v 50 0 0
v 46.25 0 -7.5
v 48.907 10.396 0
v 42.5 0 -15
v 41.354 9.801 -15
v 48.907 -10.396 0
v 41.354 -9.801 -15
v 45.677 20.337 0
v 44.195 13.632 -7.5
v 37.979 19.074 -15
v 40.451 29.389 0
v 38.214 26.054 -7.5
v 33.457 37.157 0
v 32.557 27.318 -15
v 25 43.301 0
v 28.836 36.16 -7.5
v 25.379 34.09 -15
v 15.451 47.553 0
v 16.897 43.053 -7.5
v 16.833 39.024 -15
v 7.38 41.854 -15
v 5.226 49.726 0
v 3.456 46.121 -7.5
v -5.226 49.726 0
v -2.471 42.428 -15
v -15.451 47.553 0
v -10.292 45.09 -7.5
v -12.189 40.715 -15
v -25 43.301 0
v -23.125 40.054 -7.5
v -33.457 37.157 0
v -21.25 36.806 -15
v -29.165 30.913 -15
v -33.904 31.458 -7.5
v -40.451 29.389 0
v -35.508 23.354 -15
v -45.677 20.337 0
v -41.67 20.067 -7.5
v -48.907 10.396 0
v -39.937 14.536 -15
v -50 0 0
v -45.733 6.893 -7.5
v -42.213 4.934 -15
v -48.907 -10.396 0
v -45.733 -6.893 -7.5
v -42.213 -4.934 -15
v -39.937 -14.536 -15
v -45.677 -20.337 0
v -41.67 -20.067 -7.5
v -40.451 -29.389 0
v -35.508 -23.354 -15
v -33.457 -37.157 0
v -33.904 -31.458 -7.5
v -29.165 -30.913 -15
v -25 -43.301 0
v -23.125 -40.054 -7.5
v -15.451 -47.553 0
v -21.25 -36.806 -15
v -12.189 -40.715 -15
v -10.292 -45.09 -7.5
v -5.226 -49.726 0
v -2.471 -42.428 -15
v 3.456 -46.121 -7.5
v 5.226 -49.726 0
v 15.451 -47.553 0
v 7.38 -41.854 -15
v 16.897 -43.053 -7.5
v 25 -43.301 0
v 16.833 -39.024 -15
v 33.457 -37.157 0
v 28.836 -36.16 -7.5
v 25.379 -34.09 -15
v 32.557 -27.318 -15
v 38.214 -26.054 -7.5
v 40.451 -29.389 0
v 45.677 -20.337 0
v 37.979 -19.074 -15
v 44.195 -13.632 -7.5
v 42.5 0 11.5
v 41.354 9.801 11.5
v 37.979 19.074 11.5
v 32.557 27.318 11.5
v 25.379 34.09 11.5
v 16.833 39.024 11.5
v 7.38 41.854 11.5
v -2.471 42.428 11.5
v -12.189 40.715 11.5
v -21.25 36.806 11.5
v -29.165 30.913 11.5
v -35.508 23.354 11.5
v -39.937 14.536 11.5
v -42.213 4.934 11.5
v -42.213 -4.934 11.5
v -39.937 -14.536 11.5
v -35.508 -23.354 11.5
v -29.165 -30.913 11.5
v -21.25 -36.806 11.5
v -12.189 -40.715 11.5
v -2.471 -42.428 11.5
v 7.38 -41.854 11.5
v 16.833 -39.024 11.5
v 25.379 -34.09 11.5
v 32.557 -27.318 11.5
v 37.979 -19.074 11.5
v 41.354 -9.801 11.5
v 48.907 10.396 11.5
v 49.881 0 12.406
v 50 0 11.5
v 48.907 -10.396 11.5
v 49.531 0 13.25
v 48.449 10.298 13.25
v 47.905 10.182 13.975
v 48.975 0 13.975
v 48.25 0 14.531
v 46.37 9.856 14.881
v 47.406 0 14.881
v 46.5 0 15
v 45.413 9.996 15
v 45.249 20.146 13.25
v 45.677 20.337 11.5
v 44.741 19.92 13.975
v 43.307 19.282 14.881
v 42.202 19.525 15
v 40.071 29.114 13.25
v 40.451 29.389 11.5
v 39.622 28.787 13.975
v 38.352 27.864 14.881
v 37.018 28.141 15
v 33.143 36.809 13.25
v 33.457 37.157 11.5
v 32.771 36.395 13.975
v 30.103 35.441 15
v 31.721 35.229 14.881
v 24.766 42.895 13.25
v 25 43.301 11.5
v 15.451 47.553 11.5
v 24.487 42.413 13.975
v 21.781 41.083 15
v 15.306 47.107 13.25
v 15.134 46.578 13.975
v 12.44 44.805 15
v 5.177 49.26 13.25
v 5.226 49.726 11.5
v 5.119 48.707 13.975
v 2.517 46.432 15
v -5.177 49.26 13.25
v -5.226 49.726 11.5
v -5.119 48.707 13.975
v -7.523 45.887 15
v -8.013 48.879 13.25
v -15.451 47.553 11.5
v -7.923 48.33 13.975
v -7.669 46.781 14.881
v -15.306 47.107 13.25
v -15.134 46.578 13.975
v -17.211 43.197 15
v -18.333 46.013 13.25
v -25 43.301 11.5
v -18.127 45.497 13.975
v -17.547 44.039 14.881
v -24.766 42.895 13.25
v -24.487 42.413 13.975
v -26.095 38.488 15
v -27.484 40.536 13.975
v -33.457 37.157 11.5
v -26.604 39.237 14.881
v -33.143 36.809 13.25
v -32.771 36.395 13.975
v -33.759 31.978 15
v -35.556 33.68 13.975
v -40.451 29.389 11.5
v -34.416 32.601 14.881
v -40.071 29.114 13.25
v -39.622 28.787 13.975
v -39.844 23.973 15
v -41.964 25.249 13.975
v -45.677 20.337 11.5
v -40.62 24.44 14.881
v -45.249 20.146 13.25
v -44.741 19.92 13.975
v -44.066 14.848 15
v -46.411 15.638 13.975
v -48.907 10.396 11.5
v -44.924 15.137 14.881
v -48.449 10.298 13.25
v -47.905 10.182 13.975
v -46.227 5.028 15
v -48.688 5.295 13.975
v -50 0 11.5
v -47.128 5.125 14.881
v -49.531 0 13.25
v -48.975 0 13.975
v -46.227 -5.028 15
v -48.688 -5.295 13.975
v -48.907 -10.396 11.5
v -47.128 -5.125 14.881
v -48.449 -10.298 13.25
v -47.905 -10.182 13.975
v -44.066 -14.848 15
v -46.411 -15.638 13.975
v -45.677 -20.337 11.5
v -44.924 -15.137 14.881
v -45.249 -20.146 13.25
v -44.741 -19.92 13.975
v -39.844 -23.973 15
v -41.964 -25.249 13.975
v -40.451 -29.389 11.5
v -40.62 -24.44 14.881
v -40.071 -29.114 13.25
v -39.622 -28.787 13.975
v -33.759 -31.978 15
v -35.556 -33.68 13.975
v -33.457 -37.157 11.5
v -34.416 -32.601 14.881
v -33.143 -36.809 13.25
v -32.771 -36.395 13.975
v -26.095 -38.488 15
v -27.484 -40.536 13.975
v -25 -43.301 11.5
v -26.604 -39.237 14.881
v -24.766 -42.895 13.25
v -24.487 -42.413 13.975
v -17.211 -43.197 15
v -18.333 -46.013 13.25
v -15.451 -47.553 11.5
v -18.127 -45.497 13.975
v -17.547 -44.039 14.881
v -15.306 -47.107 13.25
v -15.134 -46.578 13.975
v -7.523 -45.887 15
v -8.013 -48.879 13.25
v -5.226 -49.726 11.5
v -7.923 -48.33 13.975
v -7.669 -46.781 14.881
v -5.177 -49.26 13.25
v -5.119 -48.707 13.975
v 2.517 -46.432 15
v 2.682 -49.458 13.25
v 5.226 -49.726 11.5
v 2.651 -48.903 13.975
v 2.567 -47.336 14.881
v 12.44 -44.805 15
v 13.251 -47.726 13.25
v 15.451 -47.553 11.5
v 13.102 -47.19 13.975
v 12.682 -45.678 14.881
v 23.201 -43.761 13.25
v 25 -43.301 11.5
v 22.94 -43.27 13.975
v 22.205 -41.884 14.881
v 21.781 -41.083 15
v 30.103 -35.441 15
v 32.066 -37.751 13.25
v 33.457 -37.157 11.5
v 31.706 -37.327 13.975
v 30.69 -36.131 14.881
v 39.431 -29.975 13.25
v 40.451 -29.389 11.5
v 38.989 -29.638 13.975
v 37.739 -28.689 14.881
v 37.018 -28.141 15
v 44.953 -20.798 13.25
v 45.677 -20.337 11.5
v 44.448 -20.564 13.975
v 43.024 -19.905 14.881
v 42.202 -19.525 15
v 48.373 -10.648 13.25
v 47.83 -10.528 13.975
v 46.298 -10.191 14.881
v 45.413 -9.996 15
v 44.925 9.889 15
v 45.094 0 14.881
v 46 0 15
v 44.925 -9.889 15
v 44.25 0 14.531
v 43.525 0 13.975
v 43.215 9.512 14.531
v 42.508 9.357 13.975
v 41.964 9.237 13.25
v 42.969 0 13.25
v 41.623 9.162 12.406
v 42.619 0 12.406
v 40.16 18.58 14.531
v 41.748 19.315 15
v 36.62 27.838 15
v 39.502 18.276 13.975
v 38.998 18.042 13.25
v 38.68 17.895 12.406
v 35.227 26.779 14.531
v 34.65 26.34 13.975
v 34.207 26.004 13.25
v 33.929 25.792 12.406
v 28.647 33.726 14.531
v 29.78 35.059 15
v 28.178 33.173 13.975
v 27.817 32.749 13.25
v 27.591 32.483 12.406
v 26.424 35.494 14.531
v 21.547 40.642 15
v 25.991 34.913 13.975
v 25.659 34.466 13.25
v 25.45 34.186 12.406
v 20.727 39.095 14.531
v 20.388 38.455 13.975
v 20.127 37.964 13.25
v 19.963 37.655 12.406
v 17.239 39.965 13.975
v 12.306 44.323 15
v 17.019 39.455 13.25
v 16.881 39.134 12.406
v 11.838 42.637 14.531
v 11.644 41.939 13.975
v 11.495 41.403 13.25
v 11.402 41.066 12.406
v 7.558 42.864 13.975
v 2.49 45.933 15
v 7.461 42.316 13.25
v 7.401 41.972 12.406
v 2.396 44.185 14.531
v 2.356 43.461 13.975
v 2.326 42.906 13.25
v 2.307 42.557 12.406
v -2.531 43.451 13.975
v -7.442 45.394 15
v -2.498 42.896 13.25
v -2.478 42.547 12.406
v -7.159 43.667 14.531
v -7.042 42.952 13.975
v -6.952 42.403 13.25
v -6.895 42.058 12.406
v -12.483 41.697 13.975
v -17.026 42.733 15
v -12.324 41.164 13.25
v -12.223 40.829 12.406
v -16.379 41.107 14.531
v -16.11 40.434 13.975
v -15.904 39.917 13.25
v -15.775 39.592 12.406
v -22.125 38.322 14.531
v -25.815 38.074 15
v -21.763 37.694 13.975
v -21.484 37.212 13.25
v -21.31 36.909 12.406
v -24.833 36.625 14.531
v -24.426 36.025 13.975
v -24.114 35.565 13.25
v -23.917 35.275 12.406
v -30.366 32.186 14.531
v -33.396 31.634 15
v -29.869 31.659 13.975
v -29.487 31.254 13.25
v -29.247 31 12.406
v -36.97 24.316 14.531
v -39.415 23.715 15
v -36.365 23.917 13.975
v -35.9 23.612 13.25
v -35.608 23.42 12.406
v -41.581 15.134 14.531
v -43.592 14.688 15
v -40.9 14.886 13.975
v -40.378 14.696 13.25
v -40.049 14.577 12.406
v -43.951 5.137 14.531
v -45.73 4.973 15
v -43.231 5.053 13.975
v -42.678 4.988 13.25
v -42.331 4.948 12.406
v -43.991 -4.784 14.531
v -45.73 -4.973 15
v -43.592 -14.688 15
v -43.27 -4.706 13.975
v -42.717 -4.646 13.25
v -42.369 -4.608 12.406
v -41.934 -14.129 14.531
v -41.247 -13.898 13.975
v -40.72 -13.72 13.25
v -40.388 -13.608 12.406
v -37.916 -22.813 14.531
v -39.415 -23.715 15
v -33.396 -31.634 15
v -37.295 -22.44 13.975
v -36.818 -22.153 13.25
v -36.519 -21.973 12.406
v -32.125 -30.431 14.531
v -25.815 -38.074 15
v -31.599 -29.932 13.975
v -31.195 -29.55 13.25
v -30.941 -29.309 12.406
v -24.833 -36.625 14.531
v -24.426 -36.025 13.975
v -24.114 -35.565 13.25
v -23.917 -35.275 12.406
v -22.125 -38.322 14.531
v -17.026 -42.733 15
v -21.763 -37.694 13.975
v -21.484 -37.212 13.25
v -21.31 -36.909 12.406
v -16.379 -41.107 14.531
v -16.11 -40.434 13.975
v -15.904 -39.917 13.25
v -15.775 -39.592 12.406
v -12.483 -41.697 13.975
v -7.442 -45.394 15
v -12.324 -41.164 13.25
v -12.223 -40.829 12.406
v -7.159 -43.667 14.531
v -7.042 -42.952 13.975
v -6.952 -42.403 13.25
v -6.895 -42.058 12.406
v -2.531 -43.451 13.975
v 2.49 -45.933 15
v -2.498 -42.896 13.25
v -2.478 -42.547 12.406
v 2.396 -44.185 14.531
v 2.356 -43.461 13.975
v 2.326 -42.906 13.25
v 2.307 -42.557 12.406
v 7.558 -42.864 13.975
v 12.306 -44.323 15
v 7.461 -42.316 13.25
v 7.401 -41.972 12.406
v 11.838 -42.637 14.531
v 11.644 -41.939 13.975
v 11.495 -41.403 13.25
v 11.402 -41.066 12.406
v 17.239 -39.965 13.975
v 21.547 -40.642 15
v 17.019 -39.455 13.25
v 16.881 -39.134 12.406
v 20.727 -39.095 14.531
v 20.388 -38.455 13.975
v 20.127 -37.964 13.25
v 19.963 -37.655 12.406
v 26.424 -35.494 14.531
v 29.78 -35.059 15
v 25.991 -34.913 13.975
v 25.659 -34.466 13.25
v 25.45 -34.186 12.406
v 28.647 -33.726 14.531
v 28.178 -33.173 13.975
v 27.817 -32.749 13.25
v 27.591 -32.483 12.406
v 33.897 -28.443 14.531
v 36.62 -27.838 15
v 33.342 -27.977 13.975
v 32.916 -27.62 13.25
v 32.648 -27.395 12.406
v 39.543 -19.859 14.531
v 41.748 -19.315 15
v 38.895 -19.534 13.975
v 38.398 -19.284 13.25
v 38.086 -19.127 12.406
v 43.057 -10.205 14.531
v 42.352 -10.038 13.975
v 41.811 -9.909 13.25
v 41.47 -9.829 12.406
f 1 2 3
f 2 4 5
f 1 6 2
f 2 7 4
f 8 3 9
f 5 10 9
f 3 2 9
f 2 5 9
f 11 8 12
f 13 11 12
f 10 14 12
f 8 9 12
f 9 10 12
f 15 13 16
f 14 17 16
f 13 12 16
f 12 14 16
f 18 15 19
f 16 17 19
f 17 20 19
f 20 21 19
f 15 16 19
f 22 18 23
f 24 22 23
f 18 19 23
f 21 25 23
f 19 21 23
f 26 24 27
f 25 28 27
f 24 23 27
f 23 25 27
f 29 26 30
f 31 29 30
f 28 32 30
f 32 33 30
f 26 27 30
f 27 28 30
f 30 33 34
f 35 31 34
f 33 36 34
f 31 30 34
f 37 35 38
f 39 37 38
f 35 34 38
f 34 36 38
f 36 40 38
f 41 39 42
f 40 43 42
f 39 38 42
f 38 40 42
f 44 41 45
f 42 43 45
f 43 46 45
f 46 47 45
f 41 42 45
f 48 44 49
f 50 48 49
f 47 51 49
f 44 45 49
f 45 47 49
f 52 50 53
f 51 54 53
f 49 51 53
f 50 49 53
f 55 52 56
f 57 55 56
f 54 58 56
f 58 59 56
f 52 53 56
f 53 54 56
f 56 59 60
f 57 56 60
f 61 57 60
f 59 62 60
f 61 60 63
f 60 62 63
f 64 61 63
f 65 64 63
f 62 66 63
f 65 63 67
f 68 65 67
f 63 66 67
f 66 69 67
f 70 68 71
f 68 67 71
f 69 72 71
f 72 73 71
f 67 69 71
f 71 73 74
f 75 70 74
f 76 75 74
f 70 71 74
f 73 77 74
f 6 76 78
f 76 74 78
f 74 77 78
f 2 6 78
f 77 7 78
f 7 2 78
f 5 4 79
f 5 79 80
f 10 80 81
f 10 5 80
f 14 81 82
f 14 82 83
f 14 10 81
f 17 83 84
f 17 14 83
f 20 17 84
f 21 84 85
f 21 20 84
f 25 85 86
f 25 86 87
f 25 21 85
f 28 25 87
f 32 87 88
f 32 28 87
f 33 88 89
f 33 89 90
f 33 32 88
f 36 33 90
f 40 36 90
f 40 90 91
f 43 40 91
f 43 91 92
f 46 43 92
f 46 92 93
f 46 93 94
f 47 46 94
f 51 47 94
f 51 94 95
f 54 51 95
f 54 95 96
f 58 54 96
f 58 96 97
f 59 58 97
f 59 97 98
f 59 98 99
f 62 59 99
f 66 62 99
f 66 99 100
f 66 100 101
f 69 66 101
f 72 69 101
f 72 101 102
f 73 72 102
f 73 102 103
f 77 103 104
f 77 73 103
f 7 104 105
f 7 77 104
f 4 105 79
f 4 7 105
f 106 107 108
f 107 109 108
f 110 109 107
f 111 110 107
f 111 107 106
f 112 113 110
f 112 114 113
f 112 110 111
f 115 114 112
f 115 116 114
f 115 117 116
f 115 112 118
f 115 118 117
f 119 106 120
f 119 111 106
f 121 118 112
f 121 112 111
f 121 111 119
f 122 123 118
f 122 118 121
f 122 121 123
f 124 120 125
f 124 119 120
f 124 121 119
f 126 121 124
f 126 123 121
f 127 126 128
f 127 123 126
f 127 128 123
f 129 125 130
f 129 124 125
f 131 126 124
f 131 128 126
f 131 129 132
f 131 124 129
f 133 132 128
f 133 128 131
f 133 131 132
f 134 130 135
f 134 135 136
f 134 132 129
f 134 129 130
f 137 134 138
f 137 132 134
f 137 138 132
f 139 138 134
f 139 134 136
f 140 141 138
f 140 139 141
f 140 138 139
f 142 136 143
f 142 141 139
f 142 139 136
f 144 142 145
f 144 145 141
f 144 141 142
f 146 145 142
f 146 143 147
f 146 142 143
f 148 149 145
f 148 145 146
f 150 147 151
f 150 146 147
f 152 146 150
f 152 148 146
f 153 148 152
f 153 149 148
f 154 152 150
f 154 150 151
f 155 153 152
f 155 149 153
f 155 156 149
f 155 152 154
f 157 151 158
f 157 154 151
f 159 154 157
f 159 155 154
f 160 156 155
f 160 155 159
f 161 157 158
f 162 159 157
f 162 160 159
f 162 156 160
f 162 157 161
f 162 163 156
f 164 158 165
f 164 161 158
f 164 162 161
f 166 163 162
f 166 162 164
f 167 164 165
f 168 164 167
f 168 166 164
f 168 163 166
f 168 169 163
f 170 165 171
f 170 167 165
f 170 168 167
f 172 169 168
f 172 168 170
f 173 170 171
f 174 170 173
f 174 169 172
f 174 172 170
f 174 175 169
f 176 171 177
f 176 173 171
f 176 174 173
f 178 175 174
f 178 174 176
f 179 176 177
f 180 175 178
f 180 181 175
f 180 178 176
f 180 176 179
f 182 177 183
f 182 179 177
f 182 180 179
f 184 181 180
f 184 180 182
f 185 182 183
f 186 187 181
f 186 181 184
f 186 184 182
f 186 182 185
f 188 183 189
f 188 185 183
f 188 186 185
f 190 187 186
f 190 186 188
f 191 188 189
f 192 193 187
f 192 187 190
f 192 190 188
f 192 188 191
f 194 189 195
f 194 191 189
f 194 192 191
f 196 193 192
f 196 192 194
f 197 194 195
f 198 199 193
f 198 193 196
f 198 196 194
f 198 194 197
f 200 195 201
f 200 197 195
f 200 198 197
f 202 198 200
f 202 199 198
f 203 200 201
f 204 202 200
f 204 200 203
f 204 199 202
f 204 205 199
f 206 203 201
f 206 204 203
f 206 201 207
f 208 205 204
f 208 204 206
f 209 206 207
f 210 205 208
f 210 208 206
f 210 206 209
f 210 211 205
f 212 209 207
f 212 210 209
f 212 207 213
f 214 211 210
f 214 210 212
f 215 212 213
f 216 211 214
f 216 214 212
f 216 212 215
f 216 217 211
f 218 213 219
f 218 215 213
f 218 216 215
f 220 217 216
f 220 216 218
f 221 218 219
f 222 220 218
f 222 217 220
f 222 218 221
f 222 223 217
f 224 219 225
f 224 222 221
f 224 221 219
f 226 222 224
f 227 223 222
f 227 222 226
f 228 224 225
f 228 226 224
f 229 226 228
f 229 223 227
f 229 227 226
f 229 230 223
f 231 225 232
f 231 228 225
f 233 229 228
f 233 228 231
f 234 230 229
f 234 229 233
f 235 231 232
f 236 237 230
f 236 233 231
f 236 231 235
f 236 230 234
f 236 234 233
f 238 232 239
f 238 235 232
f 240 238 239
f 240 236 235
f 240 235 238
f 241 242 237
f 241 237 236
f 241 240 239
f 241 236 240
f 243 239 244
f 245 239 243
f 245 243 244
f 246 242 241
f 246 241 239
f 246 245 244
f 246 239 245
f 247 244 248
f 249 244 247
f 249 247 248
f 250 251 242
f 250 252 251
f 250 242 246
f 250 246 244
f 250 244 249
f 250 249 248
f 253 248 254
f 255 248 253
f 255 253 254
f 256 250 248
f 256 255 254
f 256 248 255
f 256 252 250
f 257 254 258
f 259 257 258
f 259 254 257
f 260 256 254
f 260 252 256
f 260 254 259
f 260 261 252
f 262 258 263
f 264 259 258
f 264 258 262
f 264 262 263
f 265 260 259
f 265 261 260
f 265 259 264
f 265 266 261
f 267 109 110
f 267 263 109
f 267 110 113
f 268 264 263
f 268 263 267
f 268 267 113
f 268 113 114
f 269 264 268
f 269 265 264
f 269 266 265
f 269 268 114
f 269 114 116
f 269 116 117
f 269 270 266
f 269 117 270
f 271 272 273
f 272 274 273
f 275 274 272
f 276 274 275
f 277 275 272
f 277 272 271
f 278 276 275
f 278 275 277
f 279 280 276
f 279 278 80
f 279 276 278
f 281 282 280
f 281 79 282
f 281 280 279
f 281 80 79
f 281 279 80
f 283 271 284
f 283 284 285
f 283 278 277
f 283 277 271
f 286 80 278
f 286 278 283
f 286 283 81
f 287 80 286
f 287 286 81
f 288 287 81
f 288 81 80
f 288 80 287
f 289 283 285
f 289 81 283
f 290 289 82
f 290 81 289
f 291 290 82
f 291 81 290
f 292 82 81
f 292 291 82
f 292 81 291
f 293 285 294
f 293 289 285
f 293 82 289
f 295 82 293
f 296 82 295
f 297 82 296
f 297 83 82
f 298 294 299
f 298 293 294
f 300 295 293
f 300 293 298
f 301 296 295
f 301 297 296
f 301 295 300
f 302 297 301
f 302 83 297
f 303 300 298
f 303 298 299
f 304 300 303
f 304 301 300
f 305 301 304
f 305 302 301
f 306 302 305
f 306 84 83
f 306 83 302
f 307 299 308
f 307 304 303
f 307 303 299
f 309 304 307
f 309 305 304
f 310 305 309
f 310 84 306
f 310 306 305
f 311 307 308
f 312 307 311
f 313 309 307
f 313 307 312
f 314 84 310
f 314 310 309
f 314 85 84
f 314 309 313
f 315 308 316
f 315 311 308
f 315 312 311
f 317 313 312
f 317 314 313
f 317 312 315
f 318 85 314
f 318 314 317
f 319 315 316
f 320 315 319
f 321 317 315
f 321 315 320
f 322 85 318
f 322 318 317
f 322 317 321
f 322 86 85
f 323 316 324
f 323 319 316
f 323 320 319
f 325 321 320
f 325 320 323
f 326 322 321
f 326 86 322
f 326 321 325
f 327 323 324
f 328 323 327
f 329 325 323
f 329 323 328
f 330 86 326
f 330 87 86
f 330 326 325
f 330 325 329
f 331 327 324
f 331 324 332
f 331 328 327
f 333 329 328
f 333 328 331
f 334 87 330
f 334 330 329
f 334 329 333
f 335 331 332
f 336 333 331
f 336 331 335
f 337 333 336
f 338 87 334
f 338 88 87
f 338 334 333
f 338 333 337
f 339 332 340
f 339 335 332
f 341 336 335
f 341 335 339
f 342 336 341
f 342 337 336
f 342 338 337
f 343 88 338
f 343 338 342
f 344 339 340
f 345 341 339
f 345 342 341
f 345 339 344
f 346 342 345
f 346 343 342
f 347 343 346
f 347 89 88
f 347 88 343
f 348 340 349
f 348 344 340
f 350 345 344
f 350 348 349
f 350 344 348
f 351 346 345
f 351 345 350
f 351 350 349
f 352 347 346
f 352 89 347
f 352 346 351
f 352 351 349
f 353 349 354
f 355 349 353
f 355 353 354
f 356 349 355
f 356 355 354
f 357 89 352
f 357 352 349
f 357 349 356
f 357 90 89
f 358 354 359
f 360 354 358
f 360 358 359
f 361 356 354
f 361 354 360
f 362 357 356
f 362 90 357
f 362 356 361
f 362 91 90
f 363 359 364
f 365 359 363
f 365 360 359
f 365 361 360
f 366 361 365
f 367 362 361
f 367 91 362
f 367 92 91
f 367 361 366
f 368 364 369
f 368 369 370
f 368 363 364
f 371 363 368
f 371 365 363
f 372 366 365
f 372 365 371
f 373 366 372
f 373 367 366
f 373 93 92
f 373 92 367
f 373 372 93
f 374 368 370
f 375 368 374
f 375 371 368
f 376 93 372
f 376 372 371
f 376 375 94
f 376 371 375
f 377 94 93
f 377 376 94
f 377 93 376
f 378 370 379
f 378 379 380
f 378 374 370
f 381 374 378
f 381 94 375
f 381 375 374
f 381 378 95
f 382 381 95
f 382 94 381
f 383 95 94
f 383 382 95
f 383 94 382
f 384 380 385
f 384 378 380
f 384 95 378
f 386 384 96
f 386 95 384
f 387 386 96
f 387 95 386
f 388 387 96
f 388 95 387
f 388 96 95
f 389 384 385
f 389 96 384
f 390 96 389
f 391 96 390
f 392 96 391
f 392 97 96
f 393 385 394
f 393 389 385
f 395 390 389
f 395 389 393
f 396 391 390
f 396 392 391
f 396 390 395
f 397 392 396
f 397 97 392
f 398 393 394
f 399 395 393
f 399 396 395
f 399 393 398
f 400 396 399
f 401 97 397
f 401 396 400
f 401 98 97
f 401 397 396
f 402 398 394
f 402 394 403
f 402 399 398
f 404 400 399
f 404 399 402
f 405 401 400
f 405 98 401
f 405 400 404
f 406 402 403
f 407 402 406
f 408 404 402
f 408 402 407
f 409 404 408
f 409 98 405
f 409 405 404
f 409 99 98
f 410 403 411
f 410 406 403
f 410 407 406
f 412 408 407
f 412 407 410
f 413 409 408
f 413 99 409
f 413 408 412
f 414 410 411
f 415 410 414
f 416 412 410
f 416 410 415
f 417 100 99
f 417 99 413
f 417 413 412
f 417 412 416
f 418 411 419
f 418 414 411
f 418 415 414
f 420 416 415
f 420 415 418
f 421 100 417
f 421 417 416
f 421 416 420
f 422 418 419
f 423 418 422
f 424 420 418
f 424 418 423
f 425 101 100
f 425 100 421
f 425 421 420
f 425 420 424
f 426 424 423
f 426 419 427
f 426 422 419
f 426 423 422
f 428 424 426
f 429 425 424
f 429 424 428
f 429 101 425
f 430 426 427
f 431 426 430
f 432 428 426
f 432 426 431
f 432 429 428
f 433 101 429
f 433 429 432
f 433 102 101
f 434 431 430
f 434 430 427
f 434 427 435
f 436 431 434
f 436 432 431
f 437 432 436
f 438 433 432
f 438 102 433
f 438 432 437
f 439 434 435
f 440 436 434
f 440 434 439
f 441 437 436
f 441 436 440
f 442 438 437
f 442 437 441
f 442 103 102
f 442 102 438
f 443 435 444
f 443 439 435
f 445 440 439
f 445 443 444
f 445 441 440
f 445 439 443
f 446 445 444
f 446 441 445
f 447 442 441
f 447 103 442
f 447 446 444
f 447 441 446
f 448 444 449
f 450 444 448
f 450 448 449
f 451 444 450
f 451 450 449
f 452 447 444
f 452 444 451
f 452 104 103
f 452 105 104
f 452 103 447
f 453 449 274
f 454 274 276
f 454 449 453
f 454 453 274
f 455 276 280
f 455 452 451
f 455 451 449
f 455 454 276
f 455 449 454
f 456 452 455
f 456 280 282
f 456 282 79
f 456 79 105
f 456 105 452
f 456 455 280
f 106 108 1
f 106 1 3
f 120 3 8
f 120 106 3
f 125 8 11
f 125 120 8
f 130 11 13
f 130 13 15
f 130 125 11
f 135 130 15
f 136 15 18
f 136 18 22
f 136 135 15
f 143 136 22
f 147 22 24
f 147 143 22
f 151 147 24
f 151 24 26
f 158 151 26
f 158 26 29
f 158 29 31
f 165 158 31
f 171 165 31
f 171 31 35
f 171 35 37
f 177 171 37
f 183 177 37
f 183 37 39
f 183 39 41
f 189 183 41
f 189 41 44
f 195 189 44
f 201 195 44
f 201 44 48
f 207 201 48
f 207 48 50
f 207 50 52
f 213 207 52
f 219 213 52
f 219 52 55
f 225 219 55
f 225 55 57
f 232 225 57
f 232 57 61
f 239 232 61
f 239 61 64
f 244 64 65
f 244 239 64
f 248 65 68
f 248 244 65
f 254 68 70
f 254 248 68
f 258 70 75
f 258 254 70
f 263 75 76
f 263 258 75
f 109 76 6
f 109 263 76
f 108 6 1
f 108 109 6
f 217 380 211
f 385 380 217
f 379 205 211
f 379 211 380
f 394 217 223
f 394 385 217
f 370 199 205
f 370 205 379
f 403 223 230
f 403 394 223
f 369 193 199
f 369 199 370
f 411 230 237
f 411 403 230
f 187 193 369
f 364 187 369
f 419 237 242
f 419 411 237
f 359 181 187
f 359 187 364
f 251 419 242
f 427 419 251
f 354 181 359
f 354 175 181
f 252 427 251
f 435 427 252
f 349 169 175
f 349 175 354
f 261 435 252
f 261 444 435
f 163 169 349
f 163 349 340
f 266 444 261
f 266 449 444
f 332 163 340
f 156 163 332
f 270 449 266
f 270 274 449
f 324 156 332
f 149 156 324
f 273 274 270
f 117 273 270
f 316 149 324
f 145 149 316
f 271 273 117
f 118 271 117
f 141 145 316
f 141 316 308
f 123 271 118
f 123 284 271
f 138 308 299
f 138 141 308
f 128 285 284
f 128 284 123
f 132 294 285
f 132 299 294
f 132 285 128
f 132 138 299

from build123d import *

# Parameters (mm, degrees)
F0_R     = 50
F0_R_2   = 42.5
F1_DEPTH = 15
F2_SIZE2 = 7.49999
F2_SIZE  = 14.99999
F3_R     = 3.5


# Not quite as in the source:
# - a fillet or chamfer is up to 0.001 mm smaller than in the source, because OpenCascade refuses the exact size


with BuildPart() as f1:
    # F0 (on Top) → F1 (new body, symmetric)
    with BuildSketch(Plane.XY):
        Circle(F0_R)
        Circle(F0_R_2, mode=Mode.SUBTRACT)
    extrude(amount=F1_DEPTH, both=True)

    # F2 (size 15 and 7.5 in the source; OpenCascade refuses exactly that, so slightly less here)
    f2_edges = [f1.edges().sort_by_distance(p)[0] for p in [
        (-50, 0, -15),
    ]]
    f2_side = f1.faces().sort_by_distance((-50, 0, 0))[0]
    chamfer(f2_edges, length=F2_SIZE, length2=F2_SIZE2, reference=f2_side)

    # F3
    f3_edges = [f1.edges().sort_by_distance(p)[0] for p in [
        (-50, 0, 15),
        (-42.5, 0, 15),
    ]]
    fillet(f3_edges, radius=F3_R)


solid = f1.part
